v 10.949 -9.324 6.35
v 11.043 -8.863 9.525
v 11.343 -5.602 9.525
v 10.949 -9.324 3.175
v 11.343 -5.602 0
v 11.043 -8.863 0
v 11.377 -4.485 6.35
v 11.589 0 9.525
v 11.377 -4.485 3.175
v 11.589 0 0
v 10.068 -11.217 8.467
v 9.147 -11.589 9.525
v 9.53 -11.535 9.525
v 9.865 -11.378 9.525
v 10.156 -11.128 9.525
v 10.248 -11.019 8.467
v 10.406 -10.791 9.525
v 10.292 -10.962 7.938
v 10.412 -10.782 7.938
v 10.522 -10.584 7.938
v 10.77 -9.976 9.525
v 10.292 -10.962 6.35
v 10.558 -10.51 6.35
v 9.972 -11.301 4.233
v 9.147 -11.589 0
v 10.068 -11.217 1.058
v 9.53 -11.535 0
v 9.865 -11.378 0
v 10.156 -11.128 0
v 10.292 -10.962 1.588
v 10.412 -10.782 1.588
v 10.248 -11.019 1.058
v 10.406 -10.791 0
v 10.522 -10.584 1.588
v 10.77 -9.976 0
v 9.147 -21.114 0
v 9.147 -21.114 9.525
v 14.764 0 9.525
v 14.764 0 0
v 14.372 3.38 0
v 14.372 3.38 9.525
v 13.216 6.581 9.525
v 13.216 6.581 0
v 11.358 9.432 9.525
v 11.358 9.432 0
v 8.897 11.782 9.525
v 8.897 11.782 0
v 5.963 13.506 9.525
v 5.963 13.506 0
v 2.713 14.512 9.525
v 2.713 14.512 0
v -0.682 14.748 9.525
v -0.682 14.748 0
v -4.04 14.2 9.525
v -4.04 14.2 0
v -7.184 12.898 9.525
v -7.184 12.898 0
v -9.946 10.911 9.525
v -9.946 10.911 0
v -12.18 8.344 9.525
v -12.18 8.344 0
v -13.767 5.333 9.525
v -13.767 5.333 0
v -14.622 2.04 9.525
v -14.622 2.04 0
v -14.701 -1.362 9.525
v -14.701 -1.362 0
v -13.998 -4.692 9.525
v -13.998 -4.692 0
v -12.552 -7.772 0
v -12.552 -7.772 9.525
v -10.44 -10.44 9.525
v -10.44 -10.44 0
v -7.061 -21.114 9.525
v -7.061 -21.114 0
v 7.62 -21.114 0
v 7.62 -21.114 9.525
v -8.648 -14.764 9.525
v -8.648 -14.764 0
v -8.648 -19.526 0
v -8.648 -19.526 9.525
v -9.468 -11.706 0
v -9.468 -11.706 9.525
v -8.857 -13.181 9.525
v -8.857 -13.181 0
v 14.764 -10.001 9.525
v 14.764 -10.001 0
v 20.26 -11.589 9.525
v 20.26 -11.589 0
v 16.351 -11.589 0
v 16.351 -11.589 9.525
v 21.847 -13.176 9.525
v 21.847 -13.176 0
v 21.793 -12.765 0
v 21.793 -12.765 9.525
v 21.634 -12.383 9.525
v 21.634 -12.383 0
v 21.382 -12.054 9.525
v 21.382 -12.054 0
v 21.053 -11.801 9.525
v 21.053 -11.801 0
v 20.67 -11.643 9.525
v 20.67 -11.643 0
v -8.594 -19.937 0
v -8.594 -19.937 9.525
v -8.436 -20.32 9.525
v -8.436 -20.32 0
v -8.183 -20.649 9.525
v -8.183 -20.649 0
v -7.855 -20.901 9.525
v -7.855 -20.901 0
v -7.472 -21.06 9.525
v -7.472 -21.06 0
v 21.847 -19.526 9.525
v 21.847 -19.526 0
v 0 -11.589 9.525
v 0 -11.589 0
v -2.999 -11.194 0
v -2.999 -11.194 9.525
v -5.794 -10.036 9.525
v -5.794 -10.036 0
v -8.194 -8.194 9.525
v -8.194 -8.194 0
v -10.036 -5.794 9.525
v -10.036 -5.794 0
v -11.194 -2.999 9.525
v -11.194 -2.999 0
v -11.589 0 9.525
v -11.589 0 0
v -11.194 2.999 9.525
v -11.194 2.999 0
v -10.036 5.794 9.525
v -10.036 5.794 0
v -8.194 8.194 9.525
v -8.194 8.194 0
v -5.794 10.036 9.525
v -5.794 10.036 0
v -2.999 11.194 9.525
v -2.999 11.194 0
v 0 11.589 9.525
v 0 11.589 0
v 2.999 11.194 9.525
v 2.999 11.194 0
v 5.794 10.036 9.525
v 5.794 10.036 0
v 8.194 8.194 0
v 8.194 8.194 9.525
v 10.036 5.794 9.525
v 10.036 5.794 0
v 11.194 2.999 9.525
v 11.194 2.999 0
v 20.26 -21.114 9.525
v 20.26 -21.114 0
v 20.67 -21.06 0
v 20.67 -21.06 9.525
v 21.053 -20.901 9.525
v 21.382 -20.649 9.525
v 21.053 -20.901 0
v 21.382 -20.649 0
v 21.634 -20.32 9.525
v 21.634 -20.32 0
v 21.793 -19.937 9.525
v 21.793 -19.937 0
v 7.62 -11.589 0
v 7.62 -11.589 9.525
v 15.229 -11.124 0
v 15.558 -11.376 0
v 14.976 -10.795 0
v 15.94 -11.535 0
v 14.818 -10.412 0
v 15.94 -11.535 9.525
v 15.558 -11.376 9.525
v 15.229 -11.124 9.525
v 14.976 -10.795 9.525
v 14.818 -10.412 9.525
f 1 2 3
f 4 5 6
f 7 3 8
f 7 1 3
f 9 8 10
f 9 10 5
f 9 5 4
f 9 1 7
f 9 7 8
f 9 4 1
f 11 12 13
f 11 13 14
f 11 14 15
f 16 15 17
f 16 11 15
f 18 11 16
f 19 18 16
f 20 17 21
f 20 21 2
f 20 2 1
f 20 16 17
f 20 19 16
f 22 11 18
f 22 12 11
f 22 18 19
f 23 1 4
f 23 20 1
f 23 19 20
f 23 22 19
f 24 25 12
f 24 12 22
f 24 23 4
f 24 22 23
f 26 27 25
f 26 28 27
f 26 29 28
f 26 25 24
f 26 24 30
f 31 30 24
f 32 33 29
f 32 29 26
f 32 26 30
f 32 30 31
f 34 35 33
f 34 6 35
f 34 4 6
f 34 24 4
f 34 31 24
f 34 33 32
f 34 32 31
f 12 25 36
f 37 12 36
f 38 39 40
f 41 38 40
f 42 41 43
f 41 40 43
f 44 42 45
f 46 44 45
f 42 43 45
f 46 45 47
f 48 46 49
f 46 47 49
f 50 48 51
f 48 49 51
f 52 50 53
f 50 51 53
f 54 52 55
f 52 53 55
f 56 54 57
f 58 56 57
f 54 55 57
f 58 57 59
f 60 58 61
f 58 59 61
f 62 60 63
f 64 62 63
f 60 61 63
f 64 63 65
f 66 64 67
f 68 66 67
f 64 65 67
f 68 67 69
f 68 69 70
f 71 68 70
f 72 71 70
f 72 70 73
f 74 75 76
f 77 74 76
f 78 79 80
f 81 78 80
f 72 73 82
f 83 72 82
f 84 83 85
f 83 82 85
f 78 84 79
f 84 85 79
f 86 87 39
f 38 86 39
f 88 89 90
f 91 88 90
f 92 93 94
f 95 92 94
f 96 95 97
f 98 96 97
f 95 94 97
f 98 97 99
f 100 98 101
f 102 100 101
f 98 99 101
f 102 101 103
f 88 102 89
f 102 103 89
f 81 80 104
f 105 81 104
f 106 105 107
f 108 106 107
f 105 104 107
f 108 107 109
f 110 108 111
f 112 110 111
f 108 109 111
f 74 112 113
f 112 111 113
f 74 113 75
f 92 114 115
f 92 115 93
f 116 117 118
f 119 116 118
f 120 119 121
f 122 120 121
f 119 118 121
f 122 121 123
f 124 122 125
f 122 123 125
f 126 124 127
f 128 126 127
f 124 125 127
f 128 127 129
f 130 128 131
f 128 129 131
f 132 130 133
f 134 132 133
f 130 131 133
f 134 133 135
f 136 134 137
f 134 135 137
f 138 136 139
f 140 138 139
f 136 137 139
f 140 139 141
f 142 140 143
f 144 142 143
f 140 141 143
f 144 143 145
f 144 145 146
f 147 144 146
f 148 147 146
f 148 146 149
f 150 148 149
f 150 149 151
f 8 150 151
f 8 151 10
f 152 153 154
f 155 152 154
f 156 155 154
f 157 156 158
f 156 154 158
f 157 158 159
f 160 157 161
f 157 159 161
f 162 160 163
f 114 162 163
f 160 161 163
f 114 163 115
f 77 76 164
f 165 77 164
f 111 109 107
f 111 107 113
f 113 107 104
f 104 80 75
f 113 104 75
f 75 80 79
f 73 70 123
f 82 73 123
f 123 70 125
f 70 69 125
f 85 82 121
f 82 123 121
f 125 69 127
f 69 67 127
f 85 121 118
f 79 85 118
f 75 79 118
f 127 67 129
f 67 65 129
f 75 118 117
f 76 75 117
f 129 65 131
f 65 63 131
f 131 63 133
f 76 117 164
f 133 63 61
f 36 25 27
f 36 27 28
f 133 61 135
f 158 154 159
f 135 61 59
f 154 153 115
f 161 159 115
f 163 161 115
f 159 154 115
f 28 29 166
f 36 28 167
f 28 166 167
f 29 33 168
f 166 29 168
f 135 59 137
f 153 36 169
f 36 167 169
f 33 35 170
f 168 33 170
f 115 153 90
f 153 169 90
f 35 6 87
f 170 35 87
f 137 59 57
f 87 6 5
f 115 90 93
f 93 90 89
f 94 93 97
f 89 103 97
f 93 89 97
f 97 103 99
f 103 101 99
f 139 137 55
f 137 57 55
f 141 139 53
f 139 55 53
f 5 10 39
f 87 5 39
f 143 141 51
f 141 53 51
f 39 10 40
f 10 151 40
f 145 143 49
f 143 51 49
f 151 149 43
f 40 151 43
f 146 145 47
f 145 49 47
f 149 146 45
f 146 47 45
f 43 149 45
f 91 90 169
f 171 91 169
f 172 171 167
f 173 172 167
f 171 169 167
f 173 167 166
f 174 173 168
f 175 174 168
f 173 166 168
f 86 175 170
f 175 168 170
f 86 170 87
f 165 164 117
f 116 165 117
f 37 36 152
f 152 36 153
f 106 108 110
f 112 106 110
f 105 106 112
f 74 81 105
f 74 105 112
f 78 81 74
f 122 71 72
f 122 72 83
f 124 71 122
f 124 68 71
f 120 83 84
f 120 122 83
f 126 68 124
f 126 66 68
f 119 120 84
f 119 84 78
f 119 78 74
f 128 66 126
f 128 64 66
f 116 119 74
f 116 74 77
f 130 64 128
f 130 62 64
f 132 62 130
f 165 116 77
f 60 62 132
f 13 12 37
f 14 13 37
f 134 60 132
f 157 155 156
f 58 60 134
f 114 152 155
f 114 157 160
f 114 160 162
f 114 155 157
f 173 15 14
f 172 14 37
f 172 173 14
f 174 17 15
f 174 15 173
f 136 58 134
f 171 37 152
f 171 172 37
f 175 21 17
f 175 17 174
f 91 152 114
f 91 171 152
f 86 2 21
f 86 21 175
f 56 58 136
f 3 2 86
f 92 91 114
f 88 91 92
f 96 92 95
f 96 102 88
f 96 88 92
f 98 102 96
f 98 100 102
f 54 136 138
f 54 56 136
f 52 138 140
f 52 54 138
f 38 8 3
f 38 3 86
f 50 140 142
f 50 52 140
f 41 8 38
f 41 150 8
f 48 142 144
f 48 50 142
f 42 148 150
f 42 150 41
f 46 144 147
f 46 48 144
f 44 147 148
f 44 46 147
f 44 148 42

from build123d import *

# Parameters (mm, degrees)
F1_DEPTH = 9.525


with BuildPart() as f1:
    # F0 (on Top) → F1 (new body)
    with BuildSketch(Plane.XY):
        with BuildLine():
            ThreePointArc((0, -11.58875), (-8.194484, 8.194484), (11.58875, 0))
            add(Edge.make_bspline(
                [(9.147086, -11.58875), (12.021219, -11.58875), (11.099955, -3.330184), (11.58875, 0)],
                knots=[0, 0, 0, 0, 11.843177, 11.843177, 11.843177, 11.843177], degree=3))
            Line((9.147086, -11.58875), (9.147086, -21.11375))
            Line((9.147086, -21.11375), (20.259586, -21.11375))
            ThreePointArc((20.259586, -21.11375), (21.382118, -20.648782), (21.847086, -19.52625))
            Line((21.847086, -19.52625), (21.847086, -13.17625))
            ThreePointArc((21.847086, -13.17625), (21.382118, -12.053718), (20.259586, -11.58875))
            Line((20.259586, -11.58875), (16.35125, -11.58875))
            ThreePointArc((16.35125, -11.58875), (15.228718, -11.123782), (14.76375, -10.00125))
            Line((14.76375, -10.00125), (14.76375, 0))
            ThreePointArc((14.76375, 0), (-5.649843, 13.639926), (-10.439548, -10.439548))
            ThreePointArc((-10.439548, -10.439548), (-9.113907, -12.423509), (-8.648405, -14.76375))
            Line((-8.648405, -14.76375), (-8.648405, -19.52625))
            ThreePointArc((-8.648405, -19.52625), (-8.183437, -20.648782), (-7.060905, -21.11375))
            Line((-7.060905, -21.11375), (7.620076, -21.11375))
            Line((7.620076, -21.11375), (7.620076, -11.58875))
            Line((7.620076, -11.58875), (0, -11.58875))
        make_face()
    extrude(amount=F1_DEPTH)


solid = f1.part
